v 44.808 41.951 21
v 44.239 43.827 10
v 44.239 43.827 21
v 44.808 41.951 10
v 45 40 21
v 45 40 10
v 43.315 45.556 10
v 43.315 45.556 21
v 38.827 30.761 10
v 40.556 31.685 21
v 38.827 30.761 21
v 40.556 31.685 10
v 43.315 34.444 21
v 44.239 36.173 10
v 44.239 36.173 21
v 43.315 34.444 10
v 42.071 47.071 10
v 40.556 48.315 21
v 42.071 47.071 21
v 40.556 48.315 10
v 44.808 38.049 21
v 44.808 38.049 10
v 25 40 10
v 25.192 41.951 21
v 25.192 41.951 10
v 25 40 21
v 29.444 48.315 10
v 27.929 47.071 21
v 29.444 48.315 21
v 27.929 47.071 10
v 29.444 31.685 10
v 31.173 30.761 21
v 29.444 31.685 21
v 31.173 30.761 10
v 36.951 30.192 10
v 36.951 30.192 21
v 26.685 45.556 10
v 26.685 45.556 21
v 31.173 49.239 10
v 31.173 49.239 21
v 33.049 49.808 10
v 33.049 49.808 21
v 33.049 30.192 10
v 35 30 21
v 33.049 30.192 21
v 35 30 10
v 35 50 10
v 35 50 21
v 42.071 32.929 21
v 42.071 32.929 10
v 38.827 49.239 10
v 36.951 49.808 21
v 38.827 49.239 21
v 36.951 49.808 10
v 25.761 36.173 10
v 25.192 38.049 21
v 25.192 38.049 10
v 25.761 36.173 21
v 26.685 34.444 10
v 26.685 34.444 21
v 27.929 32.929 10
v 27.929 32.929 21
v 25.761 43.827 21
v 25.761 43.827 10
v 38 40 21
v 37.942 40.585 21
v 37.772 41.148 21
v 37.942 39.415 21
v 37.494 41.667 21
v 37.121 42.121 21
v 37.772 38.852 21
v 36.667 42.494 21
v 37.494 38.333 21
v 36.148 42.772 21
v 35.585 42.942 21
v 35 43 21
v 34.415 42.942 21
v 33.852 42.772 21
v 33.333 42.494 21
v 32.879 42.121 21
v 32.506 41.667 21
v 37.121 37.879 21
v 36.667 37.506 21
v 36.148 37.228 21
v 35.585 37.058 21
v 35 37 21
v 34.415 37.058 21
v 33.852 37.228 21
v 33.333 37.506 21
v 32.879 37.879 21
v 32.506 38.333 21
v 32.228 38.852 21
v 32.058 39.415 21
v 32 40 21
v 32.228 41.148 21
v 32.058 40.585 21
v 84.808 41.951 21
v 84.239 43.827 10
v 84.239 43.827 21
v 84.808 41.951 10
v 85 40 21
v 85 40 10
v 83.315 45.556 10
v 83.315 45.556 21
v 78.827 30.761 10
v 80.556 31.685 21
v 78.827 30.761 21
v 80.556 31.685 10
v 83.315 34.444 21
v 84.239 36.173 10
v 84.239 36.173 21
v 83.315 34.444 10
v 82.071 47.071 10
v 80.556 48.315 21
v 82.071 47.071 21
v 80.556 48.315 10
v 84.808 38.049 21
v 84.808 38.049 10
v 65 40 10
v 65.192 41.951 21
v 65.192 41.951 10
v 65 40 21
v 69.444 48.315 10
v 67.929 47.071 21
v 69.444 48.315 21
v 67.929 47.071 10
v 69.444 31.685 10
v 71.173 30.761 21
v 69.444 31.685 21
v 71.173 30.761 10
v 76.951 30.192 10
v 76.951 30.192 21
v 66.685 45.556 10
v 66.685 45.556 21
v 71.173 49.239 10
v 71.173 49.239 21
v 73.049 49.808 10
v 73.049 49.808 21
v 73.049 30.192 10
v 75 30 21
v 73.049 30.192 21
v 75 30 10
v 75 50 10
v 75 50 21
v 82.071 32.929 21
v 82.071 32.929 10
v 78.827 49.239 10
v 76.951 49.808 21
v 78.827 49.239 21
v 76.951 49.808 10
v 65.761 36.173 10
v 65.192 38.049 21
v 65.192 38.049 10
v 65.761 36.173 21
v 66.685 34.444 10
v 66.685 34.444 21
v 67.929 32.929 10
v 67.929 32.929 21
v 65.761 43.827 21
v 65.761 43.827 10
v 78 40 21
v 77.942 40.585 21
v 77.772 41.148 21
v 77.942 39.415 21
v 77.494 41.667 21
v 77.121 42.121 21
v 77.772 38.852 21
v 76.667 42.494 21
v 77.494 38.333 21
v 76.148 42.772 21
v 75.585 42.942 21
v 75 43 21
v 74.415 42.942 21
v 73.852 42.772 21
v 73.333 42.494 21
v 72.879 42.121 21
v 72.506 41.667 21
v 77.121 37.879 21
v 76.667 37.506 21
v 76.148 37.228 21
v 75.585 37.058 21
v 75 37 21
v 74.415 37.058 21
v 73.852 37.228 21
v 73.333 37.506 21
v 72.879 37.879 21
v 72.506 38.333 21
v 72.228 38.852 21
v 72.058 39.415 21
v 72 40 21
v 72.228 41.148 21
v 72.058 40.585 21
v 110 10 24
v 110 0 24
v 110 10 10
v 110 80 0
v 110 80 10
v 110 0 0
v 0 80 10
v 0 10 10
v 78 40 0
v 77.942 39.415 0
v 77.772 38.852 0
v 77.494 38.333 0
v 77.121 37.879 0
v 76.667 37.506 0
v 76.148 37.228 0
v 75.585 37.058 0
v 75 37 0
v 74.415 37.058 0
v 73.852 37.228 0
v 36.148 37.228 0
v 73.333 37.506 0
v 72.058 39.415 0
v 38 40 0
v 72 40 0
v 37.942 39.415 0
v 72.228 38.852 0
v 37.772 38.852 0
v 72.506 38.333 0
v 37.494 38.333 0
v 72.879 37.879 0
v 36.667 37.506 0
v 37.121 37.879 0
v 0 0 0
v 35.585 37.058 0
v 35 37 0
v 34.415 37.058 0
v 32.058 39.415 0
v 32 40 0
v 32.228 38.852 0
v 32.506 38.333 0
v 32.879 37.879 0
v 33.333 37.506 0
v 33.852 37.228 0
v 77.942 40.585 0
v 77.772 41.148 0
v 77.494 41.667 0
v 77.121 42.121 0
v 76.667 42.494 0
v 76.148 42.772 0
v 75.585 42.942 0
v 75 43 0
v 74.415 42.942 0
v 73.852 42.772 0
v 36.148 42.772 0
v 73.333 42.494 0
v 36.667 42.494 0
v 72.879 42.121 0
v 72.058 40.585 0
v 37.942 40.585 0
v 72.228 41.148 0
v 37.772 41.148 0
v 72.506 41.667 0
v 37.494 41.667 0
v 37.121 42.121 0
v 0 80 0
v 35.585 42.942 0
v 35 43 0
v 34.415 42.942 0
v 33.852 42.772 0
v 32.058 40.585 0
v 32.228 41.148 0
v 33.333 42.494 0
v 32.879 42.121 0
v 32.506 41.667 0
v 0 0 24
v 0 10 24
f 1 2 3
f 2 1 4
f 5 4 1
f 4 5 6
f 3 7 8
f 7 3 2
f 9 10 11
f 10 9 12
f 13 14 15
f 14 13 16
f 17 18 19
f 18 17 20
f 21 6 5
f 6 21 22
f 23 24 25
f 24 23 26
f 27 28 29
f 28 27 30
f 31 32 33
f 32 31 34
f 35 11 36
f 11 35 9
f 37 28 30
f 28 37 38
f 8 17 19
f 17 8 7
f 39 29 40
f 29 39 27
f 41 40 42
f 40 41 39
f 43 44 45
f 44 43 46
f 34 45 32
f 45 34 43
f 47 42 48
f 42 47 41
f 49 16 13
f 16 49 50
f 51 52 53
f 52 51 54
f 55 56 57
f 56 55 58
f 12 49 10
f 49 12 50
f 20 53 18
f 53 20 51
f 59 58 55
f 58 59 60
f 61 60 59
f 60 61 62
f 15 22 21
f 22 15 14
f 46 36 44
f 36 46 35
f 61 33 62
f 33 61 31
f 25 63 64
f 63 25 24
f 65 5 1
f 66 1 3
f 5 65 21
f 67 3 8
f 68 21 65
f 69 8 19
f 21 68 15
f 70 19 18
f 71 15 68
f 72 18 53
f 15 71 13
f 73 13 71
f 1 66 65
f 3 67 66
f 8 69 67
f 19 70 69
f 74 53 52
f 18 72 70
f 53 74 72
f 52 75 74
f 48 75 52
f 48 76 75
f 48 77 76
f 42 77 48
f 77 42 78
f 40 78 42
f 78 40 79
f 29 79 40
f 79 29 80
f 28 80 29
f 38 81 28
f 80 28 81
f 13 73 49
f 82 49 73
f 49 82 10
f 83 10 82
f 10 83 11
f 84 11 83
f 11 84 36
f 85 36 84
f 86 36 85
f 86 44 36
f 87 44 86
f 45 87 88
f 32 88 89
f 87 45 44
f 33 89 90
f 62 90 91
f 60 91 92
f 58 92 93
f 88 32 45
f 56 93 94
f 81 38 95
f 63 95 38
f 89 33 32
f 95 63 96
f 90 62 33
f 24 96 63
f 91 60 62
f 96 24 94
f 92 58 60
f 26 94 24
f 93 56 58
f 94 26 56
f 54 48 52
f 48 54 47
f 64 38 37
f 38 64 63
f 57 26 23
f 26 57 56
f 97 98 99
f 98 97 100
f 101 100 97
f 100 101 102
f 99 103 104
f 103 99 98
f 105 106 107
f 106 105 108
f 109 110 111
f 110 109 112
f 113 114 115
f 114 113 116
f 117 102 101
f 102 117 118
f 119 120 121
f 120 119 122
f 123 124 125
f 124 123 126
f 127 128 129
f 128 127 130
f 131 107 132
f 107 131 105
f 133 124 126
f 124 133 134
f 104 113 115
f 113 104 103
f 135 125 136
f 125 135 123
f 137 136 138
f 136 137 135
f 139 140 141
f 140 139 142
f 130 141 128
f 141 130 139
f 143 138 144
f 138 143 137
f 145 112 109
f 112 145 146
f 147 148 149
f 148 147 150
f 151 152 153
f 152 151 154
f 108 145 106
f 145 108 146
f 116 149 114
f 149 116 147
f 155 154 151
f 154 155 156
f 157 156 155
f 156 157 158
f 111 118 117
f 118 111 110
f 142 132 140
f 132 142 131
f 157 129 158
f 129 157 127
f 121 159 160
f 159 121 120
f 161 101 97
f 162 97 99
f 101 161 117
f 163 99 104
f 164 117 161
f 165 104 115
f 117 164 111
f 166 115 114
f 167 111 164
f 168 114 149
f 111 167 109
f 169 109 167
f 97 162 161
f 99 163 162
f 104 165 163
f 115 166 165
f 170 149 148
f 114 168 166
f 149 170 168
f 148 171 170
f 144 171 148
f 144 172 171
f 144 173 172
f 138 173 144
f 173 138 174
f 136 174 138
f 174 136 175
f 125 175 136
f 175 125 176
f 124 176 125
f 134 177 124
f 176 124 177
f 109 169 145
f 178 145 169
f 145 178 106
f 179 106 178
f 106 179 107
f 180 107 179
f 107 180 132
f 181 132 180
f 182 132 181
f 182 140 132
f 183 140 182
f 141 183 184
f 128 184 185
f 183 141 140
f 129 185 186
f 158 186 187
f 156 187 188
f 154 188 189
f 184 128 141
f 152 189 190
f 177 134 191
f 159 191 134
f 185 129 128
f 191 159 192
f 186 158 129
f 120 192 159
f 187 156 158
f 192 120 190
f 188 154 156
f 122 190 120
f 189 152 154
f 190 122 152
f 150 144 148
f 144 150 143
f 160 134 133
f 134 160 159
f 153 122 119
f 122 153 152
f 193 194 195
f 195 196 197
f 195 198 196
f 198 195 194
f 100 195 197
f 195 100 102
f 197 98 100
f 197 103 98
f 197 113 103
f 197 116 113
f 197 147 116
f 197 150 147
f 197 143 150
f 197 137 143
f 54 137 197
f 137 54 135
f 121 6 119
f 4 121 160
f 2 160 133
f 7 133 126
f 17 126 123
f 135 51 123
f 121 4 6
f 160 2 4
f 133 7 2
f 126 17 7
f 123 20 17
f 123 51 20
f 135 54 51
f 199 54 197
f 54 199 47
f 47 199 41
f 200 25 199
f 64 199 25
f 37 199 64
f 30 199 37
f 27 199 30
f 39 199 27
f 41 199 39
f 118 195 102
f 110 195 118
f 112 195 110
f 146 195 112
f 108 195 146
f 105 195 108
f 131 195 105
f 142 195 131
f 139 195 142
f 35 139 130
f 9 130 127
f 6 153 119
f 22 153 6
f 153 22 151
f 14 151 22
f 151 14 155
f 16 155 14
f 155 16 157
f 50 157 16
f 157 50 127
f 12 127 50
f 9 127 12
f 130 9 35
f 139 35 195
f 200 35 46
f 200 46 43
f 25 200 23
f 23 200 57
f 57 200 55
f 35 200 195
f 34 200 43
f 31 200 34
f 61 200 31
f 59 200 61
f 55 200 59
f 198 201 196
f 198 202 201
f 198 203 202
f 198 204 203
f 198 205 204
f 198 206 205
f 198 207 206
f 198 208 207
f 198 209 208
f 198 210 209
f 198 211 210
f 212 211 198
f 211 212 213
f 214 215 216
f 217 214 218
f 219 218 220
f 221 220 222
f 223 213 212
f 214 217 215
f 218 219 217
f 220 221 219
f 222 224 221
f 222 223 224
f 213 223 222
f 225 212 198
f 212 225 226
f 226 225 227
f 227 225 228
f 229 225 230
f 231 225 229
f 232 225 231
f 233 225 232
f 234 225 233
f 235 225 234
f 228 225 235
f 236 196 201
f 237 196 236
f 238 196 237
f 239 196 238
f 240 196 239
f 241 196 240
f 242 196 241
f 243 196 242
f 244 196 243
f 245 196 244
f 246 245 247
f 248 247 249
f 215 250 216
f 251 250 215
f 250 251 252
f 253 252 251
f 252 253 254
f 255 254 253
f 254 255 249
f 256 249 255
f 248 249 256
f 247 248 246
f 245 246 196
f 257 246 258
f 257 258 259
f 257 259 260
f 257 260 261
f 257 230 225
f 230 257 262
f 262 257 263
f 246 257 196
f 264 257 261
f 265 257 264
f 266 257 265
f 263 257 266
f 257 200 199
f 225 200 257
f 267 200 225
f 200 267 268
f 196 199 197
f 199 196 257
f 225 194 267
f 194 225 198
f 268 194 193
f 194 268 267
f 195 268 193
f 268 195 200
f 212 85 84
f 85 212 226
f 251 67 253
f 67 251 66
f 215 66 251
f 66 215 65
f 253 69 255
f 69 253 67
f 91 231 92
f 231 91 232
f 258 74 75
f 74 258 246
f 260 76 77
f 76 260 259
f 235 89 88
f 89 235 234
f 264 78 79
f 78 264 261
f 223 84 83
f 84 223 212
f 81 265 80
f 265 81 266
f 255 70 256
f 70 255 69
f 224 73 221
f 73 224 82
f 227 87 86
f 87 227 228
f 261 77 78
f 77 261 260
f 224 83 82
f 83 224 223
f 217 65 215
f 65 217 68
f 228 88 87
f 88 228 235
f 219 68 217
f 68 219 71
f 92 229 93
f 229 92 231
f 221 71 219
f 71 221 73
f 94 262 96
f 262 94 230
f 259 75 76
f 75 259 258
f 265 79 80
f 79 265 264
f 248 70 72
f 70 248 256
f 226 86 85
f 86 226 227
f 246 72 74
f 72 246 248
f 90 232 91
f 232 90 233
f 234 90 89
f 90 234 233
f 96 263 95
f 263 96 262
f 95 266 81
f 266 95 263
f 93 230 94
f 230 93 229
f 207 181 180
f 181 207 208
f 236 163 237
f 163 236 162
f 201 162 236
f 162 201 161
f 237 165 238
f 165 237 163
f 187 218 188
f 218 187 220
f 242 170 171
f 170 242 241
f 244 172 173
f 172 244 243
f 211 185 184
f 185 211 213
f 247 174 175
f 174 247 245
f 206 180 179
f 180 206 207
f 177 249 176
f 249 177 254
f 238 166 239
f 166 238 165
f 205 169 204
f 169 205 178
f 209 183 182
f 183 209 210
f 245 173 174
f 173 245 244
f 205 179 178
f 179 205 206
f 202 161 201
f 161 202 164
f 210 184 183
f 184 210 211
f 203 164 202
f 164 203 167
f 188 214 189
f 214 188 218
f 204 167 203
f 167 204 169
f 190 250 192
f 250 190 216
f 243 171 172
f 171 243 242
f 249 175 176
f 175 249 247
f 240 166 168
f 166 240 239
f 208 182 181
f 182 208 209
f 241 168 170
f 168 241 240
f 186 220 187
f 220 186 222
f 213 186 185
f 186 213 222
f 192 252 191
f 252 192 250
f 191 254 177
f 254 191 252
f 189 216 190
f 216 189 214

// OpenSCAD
$fn = 32;

// ----------------------------------------------------------------------
// Drill jig: fence jig
// ----------------------------------------------------------------------

// --- parameters (mm) ---
plate_l = 110;            // plate length, X
plate_w = 80;             // plate width, Y
plate_t = 10;             // plate thickness
boss_d = 20;              // guide boss diameter
boss_h = 12;              // boss height above the plate
guide_d = 6;              // guide hole diameter
boss_pitch = 40;          // boss pitch
fence_h = 15;             // fence height above the plate
fence_t = 10;             // fence thickness

n_boss = 2;  // guide bosses
boss_x0 = (plate_l - (n_boss - 1) * boss_pitch) / 2;  // first boss X
boss_top = plate_t - 1 + boss_h;  // boss crown height
fence_top = plate_t - 1 + fence_h;  // fence crown height
total_h = max([fence_top, boss_top]);  // overall height

difference() {
  union() {
  cube([plate_l, plate_w, plate_t]);
  for (i = [0 : n_boss - 1])
    translate([boss_x0 + i * boss_pitch, plate_w / 2, plate_t - 1])
      cylinder(h = boss_h, d = boss_d);
  translate([0, 0, plate_t - 1]) cube([plate_l, fence_t, fence_h]);
  }
  for (i = [0 : n_boss - 1])
    translate([boss_x0 + i * boss_pitch, plate_w / 2, -1])
      cylinder(h = plate_t + boss_h, d = guide_d);
}
